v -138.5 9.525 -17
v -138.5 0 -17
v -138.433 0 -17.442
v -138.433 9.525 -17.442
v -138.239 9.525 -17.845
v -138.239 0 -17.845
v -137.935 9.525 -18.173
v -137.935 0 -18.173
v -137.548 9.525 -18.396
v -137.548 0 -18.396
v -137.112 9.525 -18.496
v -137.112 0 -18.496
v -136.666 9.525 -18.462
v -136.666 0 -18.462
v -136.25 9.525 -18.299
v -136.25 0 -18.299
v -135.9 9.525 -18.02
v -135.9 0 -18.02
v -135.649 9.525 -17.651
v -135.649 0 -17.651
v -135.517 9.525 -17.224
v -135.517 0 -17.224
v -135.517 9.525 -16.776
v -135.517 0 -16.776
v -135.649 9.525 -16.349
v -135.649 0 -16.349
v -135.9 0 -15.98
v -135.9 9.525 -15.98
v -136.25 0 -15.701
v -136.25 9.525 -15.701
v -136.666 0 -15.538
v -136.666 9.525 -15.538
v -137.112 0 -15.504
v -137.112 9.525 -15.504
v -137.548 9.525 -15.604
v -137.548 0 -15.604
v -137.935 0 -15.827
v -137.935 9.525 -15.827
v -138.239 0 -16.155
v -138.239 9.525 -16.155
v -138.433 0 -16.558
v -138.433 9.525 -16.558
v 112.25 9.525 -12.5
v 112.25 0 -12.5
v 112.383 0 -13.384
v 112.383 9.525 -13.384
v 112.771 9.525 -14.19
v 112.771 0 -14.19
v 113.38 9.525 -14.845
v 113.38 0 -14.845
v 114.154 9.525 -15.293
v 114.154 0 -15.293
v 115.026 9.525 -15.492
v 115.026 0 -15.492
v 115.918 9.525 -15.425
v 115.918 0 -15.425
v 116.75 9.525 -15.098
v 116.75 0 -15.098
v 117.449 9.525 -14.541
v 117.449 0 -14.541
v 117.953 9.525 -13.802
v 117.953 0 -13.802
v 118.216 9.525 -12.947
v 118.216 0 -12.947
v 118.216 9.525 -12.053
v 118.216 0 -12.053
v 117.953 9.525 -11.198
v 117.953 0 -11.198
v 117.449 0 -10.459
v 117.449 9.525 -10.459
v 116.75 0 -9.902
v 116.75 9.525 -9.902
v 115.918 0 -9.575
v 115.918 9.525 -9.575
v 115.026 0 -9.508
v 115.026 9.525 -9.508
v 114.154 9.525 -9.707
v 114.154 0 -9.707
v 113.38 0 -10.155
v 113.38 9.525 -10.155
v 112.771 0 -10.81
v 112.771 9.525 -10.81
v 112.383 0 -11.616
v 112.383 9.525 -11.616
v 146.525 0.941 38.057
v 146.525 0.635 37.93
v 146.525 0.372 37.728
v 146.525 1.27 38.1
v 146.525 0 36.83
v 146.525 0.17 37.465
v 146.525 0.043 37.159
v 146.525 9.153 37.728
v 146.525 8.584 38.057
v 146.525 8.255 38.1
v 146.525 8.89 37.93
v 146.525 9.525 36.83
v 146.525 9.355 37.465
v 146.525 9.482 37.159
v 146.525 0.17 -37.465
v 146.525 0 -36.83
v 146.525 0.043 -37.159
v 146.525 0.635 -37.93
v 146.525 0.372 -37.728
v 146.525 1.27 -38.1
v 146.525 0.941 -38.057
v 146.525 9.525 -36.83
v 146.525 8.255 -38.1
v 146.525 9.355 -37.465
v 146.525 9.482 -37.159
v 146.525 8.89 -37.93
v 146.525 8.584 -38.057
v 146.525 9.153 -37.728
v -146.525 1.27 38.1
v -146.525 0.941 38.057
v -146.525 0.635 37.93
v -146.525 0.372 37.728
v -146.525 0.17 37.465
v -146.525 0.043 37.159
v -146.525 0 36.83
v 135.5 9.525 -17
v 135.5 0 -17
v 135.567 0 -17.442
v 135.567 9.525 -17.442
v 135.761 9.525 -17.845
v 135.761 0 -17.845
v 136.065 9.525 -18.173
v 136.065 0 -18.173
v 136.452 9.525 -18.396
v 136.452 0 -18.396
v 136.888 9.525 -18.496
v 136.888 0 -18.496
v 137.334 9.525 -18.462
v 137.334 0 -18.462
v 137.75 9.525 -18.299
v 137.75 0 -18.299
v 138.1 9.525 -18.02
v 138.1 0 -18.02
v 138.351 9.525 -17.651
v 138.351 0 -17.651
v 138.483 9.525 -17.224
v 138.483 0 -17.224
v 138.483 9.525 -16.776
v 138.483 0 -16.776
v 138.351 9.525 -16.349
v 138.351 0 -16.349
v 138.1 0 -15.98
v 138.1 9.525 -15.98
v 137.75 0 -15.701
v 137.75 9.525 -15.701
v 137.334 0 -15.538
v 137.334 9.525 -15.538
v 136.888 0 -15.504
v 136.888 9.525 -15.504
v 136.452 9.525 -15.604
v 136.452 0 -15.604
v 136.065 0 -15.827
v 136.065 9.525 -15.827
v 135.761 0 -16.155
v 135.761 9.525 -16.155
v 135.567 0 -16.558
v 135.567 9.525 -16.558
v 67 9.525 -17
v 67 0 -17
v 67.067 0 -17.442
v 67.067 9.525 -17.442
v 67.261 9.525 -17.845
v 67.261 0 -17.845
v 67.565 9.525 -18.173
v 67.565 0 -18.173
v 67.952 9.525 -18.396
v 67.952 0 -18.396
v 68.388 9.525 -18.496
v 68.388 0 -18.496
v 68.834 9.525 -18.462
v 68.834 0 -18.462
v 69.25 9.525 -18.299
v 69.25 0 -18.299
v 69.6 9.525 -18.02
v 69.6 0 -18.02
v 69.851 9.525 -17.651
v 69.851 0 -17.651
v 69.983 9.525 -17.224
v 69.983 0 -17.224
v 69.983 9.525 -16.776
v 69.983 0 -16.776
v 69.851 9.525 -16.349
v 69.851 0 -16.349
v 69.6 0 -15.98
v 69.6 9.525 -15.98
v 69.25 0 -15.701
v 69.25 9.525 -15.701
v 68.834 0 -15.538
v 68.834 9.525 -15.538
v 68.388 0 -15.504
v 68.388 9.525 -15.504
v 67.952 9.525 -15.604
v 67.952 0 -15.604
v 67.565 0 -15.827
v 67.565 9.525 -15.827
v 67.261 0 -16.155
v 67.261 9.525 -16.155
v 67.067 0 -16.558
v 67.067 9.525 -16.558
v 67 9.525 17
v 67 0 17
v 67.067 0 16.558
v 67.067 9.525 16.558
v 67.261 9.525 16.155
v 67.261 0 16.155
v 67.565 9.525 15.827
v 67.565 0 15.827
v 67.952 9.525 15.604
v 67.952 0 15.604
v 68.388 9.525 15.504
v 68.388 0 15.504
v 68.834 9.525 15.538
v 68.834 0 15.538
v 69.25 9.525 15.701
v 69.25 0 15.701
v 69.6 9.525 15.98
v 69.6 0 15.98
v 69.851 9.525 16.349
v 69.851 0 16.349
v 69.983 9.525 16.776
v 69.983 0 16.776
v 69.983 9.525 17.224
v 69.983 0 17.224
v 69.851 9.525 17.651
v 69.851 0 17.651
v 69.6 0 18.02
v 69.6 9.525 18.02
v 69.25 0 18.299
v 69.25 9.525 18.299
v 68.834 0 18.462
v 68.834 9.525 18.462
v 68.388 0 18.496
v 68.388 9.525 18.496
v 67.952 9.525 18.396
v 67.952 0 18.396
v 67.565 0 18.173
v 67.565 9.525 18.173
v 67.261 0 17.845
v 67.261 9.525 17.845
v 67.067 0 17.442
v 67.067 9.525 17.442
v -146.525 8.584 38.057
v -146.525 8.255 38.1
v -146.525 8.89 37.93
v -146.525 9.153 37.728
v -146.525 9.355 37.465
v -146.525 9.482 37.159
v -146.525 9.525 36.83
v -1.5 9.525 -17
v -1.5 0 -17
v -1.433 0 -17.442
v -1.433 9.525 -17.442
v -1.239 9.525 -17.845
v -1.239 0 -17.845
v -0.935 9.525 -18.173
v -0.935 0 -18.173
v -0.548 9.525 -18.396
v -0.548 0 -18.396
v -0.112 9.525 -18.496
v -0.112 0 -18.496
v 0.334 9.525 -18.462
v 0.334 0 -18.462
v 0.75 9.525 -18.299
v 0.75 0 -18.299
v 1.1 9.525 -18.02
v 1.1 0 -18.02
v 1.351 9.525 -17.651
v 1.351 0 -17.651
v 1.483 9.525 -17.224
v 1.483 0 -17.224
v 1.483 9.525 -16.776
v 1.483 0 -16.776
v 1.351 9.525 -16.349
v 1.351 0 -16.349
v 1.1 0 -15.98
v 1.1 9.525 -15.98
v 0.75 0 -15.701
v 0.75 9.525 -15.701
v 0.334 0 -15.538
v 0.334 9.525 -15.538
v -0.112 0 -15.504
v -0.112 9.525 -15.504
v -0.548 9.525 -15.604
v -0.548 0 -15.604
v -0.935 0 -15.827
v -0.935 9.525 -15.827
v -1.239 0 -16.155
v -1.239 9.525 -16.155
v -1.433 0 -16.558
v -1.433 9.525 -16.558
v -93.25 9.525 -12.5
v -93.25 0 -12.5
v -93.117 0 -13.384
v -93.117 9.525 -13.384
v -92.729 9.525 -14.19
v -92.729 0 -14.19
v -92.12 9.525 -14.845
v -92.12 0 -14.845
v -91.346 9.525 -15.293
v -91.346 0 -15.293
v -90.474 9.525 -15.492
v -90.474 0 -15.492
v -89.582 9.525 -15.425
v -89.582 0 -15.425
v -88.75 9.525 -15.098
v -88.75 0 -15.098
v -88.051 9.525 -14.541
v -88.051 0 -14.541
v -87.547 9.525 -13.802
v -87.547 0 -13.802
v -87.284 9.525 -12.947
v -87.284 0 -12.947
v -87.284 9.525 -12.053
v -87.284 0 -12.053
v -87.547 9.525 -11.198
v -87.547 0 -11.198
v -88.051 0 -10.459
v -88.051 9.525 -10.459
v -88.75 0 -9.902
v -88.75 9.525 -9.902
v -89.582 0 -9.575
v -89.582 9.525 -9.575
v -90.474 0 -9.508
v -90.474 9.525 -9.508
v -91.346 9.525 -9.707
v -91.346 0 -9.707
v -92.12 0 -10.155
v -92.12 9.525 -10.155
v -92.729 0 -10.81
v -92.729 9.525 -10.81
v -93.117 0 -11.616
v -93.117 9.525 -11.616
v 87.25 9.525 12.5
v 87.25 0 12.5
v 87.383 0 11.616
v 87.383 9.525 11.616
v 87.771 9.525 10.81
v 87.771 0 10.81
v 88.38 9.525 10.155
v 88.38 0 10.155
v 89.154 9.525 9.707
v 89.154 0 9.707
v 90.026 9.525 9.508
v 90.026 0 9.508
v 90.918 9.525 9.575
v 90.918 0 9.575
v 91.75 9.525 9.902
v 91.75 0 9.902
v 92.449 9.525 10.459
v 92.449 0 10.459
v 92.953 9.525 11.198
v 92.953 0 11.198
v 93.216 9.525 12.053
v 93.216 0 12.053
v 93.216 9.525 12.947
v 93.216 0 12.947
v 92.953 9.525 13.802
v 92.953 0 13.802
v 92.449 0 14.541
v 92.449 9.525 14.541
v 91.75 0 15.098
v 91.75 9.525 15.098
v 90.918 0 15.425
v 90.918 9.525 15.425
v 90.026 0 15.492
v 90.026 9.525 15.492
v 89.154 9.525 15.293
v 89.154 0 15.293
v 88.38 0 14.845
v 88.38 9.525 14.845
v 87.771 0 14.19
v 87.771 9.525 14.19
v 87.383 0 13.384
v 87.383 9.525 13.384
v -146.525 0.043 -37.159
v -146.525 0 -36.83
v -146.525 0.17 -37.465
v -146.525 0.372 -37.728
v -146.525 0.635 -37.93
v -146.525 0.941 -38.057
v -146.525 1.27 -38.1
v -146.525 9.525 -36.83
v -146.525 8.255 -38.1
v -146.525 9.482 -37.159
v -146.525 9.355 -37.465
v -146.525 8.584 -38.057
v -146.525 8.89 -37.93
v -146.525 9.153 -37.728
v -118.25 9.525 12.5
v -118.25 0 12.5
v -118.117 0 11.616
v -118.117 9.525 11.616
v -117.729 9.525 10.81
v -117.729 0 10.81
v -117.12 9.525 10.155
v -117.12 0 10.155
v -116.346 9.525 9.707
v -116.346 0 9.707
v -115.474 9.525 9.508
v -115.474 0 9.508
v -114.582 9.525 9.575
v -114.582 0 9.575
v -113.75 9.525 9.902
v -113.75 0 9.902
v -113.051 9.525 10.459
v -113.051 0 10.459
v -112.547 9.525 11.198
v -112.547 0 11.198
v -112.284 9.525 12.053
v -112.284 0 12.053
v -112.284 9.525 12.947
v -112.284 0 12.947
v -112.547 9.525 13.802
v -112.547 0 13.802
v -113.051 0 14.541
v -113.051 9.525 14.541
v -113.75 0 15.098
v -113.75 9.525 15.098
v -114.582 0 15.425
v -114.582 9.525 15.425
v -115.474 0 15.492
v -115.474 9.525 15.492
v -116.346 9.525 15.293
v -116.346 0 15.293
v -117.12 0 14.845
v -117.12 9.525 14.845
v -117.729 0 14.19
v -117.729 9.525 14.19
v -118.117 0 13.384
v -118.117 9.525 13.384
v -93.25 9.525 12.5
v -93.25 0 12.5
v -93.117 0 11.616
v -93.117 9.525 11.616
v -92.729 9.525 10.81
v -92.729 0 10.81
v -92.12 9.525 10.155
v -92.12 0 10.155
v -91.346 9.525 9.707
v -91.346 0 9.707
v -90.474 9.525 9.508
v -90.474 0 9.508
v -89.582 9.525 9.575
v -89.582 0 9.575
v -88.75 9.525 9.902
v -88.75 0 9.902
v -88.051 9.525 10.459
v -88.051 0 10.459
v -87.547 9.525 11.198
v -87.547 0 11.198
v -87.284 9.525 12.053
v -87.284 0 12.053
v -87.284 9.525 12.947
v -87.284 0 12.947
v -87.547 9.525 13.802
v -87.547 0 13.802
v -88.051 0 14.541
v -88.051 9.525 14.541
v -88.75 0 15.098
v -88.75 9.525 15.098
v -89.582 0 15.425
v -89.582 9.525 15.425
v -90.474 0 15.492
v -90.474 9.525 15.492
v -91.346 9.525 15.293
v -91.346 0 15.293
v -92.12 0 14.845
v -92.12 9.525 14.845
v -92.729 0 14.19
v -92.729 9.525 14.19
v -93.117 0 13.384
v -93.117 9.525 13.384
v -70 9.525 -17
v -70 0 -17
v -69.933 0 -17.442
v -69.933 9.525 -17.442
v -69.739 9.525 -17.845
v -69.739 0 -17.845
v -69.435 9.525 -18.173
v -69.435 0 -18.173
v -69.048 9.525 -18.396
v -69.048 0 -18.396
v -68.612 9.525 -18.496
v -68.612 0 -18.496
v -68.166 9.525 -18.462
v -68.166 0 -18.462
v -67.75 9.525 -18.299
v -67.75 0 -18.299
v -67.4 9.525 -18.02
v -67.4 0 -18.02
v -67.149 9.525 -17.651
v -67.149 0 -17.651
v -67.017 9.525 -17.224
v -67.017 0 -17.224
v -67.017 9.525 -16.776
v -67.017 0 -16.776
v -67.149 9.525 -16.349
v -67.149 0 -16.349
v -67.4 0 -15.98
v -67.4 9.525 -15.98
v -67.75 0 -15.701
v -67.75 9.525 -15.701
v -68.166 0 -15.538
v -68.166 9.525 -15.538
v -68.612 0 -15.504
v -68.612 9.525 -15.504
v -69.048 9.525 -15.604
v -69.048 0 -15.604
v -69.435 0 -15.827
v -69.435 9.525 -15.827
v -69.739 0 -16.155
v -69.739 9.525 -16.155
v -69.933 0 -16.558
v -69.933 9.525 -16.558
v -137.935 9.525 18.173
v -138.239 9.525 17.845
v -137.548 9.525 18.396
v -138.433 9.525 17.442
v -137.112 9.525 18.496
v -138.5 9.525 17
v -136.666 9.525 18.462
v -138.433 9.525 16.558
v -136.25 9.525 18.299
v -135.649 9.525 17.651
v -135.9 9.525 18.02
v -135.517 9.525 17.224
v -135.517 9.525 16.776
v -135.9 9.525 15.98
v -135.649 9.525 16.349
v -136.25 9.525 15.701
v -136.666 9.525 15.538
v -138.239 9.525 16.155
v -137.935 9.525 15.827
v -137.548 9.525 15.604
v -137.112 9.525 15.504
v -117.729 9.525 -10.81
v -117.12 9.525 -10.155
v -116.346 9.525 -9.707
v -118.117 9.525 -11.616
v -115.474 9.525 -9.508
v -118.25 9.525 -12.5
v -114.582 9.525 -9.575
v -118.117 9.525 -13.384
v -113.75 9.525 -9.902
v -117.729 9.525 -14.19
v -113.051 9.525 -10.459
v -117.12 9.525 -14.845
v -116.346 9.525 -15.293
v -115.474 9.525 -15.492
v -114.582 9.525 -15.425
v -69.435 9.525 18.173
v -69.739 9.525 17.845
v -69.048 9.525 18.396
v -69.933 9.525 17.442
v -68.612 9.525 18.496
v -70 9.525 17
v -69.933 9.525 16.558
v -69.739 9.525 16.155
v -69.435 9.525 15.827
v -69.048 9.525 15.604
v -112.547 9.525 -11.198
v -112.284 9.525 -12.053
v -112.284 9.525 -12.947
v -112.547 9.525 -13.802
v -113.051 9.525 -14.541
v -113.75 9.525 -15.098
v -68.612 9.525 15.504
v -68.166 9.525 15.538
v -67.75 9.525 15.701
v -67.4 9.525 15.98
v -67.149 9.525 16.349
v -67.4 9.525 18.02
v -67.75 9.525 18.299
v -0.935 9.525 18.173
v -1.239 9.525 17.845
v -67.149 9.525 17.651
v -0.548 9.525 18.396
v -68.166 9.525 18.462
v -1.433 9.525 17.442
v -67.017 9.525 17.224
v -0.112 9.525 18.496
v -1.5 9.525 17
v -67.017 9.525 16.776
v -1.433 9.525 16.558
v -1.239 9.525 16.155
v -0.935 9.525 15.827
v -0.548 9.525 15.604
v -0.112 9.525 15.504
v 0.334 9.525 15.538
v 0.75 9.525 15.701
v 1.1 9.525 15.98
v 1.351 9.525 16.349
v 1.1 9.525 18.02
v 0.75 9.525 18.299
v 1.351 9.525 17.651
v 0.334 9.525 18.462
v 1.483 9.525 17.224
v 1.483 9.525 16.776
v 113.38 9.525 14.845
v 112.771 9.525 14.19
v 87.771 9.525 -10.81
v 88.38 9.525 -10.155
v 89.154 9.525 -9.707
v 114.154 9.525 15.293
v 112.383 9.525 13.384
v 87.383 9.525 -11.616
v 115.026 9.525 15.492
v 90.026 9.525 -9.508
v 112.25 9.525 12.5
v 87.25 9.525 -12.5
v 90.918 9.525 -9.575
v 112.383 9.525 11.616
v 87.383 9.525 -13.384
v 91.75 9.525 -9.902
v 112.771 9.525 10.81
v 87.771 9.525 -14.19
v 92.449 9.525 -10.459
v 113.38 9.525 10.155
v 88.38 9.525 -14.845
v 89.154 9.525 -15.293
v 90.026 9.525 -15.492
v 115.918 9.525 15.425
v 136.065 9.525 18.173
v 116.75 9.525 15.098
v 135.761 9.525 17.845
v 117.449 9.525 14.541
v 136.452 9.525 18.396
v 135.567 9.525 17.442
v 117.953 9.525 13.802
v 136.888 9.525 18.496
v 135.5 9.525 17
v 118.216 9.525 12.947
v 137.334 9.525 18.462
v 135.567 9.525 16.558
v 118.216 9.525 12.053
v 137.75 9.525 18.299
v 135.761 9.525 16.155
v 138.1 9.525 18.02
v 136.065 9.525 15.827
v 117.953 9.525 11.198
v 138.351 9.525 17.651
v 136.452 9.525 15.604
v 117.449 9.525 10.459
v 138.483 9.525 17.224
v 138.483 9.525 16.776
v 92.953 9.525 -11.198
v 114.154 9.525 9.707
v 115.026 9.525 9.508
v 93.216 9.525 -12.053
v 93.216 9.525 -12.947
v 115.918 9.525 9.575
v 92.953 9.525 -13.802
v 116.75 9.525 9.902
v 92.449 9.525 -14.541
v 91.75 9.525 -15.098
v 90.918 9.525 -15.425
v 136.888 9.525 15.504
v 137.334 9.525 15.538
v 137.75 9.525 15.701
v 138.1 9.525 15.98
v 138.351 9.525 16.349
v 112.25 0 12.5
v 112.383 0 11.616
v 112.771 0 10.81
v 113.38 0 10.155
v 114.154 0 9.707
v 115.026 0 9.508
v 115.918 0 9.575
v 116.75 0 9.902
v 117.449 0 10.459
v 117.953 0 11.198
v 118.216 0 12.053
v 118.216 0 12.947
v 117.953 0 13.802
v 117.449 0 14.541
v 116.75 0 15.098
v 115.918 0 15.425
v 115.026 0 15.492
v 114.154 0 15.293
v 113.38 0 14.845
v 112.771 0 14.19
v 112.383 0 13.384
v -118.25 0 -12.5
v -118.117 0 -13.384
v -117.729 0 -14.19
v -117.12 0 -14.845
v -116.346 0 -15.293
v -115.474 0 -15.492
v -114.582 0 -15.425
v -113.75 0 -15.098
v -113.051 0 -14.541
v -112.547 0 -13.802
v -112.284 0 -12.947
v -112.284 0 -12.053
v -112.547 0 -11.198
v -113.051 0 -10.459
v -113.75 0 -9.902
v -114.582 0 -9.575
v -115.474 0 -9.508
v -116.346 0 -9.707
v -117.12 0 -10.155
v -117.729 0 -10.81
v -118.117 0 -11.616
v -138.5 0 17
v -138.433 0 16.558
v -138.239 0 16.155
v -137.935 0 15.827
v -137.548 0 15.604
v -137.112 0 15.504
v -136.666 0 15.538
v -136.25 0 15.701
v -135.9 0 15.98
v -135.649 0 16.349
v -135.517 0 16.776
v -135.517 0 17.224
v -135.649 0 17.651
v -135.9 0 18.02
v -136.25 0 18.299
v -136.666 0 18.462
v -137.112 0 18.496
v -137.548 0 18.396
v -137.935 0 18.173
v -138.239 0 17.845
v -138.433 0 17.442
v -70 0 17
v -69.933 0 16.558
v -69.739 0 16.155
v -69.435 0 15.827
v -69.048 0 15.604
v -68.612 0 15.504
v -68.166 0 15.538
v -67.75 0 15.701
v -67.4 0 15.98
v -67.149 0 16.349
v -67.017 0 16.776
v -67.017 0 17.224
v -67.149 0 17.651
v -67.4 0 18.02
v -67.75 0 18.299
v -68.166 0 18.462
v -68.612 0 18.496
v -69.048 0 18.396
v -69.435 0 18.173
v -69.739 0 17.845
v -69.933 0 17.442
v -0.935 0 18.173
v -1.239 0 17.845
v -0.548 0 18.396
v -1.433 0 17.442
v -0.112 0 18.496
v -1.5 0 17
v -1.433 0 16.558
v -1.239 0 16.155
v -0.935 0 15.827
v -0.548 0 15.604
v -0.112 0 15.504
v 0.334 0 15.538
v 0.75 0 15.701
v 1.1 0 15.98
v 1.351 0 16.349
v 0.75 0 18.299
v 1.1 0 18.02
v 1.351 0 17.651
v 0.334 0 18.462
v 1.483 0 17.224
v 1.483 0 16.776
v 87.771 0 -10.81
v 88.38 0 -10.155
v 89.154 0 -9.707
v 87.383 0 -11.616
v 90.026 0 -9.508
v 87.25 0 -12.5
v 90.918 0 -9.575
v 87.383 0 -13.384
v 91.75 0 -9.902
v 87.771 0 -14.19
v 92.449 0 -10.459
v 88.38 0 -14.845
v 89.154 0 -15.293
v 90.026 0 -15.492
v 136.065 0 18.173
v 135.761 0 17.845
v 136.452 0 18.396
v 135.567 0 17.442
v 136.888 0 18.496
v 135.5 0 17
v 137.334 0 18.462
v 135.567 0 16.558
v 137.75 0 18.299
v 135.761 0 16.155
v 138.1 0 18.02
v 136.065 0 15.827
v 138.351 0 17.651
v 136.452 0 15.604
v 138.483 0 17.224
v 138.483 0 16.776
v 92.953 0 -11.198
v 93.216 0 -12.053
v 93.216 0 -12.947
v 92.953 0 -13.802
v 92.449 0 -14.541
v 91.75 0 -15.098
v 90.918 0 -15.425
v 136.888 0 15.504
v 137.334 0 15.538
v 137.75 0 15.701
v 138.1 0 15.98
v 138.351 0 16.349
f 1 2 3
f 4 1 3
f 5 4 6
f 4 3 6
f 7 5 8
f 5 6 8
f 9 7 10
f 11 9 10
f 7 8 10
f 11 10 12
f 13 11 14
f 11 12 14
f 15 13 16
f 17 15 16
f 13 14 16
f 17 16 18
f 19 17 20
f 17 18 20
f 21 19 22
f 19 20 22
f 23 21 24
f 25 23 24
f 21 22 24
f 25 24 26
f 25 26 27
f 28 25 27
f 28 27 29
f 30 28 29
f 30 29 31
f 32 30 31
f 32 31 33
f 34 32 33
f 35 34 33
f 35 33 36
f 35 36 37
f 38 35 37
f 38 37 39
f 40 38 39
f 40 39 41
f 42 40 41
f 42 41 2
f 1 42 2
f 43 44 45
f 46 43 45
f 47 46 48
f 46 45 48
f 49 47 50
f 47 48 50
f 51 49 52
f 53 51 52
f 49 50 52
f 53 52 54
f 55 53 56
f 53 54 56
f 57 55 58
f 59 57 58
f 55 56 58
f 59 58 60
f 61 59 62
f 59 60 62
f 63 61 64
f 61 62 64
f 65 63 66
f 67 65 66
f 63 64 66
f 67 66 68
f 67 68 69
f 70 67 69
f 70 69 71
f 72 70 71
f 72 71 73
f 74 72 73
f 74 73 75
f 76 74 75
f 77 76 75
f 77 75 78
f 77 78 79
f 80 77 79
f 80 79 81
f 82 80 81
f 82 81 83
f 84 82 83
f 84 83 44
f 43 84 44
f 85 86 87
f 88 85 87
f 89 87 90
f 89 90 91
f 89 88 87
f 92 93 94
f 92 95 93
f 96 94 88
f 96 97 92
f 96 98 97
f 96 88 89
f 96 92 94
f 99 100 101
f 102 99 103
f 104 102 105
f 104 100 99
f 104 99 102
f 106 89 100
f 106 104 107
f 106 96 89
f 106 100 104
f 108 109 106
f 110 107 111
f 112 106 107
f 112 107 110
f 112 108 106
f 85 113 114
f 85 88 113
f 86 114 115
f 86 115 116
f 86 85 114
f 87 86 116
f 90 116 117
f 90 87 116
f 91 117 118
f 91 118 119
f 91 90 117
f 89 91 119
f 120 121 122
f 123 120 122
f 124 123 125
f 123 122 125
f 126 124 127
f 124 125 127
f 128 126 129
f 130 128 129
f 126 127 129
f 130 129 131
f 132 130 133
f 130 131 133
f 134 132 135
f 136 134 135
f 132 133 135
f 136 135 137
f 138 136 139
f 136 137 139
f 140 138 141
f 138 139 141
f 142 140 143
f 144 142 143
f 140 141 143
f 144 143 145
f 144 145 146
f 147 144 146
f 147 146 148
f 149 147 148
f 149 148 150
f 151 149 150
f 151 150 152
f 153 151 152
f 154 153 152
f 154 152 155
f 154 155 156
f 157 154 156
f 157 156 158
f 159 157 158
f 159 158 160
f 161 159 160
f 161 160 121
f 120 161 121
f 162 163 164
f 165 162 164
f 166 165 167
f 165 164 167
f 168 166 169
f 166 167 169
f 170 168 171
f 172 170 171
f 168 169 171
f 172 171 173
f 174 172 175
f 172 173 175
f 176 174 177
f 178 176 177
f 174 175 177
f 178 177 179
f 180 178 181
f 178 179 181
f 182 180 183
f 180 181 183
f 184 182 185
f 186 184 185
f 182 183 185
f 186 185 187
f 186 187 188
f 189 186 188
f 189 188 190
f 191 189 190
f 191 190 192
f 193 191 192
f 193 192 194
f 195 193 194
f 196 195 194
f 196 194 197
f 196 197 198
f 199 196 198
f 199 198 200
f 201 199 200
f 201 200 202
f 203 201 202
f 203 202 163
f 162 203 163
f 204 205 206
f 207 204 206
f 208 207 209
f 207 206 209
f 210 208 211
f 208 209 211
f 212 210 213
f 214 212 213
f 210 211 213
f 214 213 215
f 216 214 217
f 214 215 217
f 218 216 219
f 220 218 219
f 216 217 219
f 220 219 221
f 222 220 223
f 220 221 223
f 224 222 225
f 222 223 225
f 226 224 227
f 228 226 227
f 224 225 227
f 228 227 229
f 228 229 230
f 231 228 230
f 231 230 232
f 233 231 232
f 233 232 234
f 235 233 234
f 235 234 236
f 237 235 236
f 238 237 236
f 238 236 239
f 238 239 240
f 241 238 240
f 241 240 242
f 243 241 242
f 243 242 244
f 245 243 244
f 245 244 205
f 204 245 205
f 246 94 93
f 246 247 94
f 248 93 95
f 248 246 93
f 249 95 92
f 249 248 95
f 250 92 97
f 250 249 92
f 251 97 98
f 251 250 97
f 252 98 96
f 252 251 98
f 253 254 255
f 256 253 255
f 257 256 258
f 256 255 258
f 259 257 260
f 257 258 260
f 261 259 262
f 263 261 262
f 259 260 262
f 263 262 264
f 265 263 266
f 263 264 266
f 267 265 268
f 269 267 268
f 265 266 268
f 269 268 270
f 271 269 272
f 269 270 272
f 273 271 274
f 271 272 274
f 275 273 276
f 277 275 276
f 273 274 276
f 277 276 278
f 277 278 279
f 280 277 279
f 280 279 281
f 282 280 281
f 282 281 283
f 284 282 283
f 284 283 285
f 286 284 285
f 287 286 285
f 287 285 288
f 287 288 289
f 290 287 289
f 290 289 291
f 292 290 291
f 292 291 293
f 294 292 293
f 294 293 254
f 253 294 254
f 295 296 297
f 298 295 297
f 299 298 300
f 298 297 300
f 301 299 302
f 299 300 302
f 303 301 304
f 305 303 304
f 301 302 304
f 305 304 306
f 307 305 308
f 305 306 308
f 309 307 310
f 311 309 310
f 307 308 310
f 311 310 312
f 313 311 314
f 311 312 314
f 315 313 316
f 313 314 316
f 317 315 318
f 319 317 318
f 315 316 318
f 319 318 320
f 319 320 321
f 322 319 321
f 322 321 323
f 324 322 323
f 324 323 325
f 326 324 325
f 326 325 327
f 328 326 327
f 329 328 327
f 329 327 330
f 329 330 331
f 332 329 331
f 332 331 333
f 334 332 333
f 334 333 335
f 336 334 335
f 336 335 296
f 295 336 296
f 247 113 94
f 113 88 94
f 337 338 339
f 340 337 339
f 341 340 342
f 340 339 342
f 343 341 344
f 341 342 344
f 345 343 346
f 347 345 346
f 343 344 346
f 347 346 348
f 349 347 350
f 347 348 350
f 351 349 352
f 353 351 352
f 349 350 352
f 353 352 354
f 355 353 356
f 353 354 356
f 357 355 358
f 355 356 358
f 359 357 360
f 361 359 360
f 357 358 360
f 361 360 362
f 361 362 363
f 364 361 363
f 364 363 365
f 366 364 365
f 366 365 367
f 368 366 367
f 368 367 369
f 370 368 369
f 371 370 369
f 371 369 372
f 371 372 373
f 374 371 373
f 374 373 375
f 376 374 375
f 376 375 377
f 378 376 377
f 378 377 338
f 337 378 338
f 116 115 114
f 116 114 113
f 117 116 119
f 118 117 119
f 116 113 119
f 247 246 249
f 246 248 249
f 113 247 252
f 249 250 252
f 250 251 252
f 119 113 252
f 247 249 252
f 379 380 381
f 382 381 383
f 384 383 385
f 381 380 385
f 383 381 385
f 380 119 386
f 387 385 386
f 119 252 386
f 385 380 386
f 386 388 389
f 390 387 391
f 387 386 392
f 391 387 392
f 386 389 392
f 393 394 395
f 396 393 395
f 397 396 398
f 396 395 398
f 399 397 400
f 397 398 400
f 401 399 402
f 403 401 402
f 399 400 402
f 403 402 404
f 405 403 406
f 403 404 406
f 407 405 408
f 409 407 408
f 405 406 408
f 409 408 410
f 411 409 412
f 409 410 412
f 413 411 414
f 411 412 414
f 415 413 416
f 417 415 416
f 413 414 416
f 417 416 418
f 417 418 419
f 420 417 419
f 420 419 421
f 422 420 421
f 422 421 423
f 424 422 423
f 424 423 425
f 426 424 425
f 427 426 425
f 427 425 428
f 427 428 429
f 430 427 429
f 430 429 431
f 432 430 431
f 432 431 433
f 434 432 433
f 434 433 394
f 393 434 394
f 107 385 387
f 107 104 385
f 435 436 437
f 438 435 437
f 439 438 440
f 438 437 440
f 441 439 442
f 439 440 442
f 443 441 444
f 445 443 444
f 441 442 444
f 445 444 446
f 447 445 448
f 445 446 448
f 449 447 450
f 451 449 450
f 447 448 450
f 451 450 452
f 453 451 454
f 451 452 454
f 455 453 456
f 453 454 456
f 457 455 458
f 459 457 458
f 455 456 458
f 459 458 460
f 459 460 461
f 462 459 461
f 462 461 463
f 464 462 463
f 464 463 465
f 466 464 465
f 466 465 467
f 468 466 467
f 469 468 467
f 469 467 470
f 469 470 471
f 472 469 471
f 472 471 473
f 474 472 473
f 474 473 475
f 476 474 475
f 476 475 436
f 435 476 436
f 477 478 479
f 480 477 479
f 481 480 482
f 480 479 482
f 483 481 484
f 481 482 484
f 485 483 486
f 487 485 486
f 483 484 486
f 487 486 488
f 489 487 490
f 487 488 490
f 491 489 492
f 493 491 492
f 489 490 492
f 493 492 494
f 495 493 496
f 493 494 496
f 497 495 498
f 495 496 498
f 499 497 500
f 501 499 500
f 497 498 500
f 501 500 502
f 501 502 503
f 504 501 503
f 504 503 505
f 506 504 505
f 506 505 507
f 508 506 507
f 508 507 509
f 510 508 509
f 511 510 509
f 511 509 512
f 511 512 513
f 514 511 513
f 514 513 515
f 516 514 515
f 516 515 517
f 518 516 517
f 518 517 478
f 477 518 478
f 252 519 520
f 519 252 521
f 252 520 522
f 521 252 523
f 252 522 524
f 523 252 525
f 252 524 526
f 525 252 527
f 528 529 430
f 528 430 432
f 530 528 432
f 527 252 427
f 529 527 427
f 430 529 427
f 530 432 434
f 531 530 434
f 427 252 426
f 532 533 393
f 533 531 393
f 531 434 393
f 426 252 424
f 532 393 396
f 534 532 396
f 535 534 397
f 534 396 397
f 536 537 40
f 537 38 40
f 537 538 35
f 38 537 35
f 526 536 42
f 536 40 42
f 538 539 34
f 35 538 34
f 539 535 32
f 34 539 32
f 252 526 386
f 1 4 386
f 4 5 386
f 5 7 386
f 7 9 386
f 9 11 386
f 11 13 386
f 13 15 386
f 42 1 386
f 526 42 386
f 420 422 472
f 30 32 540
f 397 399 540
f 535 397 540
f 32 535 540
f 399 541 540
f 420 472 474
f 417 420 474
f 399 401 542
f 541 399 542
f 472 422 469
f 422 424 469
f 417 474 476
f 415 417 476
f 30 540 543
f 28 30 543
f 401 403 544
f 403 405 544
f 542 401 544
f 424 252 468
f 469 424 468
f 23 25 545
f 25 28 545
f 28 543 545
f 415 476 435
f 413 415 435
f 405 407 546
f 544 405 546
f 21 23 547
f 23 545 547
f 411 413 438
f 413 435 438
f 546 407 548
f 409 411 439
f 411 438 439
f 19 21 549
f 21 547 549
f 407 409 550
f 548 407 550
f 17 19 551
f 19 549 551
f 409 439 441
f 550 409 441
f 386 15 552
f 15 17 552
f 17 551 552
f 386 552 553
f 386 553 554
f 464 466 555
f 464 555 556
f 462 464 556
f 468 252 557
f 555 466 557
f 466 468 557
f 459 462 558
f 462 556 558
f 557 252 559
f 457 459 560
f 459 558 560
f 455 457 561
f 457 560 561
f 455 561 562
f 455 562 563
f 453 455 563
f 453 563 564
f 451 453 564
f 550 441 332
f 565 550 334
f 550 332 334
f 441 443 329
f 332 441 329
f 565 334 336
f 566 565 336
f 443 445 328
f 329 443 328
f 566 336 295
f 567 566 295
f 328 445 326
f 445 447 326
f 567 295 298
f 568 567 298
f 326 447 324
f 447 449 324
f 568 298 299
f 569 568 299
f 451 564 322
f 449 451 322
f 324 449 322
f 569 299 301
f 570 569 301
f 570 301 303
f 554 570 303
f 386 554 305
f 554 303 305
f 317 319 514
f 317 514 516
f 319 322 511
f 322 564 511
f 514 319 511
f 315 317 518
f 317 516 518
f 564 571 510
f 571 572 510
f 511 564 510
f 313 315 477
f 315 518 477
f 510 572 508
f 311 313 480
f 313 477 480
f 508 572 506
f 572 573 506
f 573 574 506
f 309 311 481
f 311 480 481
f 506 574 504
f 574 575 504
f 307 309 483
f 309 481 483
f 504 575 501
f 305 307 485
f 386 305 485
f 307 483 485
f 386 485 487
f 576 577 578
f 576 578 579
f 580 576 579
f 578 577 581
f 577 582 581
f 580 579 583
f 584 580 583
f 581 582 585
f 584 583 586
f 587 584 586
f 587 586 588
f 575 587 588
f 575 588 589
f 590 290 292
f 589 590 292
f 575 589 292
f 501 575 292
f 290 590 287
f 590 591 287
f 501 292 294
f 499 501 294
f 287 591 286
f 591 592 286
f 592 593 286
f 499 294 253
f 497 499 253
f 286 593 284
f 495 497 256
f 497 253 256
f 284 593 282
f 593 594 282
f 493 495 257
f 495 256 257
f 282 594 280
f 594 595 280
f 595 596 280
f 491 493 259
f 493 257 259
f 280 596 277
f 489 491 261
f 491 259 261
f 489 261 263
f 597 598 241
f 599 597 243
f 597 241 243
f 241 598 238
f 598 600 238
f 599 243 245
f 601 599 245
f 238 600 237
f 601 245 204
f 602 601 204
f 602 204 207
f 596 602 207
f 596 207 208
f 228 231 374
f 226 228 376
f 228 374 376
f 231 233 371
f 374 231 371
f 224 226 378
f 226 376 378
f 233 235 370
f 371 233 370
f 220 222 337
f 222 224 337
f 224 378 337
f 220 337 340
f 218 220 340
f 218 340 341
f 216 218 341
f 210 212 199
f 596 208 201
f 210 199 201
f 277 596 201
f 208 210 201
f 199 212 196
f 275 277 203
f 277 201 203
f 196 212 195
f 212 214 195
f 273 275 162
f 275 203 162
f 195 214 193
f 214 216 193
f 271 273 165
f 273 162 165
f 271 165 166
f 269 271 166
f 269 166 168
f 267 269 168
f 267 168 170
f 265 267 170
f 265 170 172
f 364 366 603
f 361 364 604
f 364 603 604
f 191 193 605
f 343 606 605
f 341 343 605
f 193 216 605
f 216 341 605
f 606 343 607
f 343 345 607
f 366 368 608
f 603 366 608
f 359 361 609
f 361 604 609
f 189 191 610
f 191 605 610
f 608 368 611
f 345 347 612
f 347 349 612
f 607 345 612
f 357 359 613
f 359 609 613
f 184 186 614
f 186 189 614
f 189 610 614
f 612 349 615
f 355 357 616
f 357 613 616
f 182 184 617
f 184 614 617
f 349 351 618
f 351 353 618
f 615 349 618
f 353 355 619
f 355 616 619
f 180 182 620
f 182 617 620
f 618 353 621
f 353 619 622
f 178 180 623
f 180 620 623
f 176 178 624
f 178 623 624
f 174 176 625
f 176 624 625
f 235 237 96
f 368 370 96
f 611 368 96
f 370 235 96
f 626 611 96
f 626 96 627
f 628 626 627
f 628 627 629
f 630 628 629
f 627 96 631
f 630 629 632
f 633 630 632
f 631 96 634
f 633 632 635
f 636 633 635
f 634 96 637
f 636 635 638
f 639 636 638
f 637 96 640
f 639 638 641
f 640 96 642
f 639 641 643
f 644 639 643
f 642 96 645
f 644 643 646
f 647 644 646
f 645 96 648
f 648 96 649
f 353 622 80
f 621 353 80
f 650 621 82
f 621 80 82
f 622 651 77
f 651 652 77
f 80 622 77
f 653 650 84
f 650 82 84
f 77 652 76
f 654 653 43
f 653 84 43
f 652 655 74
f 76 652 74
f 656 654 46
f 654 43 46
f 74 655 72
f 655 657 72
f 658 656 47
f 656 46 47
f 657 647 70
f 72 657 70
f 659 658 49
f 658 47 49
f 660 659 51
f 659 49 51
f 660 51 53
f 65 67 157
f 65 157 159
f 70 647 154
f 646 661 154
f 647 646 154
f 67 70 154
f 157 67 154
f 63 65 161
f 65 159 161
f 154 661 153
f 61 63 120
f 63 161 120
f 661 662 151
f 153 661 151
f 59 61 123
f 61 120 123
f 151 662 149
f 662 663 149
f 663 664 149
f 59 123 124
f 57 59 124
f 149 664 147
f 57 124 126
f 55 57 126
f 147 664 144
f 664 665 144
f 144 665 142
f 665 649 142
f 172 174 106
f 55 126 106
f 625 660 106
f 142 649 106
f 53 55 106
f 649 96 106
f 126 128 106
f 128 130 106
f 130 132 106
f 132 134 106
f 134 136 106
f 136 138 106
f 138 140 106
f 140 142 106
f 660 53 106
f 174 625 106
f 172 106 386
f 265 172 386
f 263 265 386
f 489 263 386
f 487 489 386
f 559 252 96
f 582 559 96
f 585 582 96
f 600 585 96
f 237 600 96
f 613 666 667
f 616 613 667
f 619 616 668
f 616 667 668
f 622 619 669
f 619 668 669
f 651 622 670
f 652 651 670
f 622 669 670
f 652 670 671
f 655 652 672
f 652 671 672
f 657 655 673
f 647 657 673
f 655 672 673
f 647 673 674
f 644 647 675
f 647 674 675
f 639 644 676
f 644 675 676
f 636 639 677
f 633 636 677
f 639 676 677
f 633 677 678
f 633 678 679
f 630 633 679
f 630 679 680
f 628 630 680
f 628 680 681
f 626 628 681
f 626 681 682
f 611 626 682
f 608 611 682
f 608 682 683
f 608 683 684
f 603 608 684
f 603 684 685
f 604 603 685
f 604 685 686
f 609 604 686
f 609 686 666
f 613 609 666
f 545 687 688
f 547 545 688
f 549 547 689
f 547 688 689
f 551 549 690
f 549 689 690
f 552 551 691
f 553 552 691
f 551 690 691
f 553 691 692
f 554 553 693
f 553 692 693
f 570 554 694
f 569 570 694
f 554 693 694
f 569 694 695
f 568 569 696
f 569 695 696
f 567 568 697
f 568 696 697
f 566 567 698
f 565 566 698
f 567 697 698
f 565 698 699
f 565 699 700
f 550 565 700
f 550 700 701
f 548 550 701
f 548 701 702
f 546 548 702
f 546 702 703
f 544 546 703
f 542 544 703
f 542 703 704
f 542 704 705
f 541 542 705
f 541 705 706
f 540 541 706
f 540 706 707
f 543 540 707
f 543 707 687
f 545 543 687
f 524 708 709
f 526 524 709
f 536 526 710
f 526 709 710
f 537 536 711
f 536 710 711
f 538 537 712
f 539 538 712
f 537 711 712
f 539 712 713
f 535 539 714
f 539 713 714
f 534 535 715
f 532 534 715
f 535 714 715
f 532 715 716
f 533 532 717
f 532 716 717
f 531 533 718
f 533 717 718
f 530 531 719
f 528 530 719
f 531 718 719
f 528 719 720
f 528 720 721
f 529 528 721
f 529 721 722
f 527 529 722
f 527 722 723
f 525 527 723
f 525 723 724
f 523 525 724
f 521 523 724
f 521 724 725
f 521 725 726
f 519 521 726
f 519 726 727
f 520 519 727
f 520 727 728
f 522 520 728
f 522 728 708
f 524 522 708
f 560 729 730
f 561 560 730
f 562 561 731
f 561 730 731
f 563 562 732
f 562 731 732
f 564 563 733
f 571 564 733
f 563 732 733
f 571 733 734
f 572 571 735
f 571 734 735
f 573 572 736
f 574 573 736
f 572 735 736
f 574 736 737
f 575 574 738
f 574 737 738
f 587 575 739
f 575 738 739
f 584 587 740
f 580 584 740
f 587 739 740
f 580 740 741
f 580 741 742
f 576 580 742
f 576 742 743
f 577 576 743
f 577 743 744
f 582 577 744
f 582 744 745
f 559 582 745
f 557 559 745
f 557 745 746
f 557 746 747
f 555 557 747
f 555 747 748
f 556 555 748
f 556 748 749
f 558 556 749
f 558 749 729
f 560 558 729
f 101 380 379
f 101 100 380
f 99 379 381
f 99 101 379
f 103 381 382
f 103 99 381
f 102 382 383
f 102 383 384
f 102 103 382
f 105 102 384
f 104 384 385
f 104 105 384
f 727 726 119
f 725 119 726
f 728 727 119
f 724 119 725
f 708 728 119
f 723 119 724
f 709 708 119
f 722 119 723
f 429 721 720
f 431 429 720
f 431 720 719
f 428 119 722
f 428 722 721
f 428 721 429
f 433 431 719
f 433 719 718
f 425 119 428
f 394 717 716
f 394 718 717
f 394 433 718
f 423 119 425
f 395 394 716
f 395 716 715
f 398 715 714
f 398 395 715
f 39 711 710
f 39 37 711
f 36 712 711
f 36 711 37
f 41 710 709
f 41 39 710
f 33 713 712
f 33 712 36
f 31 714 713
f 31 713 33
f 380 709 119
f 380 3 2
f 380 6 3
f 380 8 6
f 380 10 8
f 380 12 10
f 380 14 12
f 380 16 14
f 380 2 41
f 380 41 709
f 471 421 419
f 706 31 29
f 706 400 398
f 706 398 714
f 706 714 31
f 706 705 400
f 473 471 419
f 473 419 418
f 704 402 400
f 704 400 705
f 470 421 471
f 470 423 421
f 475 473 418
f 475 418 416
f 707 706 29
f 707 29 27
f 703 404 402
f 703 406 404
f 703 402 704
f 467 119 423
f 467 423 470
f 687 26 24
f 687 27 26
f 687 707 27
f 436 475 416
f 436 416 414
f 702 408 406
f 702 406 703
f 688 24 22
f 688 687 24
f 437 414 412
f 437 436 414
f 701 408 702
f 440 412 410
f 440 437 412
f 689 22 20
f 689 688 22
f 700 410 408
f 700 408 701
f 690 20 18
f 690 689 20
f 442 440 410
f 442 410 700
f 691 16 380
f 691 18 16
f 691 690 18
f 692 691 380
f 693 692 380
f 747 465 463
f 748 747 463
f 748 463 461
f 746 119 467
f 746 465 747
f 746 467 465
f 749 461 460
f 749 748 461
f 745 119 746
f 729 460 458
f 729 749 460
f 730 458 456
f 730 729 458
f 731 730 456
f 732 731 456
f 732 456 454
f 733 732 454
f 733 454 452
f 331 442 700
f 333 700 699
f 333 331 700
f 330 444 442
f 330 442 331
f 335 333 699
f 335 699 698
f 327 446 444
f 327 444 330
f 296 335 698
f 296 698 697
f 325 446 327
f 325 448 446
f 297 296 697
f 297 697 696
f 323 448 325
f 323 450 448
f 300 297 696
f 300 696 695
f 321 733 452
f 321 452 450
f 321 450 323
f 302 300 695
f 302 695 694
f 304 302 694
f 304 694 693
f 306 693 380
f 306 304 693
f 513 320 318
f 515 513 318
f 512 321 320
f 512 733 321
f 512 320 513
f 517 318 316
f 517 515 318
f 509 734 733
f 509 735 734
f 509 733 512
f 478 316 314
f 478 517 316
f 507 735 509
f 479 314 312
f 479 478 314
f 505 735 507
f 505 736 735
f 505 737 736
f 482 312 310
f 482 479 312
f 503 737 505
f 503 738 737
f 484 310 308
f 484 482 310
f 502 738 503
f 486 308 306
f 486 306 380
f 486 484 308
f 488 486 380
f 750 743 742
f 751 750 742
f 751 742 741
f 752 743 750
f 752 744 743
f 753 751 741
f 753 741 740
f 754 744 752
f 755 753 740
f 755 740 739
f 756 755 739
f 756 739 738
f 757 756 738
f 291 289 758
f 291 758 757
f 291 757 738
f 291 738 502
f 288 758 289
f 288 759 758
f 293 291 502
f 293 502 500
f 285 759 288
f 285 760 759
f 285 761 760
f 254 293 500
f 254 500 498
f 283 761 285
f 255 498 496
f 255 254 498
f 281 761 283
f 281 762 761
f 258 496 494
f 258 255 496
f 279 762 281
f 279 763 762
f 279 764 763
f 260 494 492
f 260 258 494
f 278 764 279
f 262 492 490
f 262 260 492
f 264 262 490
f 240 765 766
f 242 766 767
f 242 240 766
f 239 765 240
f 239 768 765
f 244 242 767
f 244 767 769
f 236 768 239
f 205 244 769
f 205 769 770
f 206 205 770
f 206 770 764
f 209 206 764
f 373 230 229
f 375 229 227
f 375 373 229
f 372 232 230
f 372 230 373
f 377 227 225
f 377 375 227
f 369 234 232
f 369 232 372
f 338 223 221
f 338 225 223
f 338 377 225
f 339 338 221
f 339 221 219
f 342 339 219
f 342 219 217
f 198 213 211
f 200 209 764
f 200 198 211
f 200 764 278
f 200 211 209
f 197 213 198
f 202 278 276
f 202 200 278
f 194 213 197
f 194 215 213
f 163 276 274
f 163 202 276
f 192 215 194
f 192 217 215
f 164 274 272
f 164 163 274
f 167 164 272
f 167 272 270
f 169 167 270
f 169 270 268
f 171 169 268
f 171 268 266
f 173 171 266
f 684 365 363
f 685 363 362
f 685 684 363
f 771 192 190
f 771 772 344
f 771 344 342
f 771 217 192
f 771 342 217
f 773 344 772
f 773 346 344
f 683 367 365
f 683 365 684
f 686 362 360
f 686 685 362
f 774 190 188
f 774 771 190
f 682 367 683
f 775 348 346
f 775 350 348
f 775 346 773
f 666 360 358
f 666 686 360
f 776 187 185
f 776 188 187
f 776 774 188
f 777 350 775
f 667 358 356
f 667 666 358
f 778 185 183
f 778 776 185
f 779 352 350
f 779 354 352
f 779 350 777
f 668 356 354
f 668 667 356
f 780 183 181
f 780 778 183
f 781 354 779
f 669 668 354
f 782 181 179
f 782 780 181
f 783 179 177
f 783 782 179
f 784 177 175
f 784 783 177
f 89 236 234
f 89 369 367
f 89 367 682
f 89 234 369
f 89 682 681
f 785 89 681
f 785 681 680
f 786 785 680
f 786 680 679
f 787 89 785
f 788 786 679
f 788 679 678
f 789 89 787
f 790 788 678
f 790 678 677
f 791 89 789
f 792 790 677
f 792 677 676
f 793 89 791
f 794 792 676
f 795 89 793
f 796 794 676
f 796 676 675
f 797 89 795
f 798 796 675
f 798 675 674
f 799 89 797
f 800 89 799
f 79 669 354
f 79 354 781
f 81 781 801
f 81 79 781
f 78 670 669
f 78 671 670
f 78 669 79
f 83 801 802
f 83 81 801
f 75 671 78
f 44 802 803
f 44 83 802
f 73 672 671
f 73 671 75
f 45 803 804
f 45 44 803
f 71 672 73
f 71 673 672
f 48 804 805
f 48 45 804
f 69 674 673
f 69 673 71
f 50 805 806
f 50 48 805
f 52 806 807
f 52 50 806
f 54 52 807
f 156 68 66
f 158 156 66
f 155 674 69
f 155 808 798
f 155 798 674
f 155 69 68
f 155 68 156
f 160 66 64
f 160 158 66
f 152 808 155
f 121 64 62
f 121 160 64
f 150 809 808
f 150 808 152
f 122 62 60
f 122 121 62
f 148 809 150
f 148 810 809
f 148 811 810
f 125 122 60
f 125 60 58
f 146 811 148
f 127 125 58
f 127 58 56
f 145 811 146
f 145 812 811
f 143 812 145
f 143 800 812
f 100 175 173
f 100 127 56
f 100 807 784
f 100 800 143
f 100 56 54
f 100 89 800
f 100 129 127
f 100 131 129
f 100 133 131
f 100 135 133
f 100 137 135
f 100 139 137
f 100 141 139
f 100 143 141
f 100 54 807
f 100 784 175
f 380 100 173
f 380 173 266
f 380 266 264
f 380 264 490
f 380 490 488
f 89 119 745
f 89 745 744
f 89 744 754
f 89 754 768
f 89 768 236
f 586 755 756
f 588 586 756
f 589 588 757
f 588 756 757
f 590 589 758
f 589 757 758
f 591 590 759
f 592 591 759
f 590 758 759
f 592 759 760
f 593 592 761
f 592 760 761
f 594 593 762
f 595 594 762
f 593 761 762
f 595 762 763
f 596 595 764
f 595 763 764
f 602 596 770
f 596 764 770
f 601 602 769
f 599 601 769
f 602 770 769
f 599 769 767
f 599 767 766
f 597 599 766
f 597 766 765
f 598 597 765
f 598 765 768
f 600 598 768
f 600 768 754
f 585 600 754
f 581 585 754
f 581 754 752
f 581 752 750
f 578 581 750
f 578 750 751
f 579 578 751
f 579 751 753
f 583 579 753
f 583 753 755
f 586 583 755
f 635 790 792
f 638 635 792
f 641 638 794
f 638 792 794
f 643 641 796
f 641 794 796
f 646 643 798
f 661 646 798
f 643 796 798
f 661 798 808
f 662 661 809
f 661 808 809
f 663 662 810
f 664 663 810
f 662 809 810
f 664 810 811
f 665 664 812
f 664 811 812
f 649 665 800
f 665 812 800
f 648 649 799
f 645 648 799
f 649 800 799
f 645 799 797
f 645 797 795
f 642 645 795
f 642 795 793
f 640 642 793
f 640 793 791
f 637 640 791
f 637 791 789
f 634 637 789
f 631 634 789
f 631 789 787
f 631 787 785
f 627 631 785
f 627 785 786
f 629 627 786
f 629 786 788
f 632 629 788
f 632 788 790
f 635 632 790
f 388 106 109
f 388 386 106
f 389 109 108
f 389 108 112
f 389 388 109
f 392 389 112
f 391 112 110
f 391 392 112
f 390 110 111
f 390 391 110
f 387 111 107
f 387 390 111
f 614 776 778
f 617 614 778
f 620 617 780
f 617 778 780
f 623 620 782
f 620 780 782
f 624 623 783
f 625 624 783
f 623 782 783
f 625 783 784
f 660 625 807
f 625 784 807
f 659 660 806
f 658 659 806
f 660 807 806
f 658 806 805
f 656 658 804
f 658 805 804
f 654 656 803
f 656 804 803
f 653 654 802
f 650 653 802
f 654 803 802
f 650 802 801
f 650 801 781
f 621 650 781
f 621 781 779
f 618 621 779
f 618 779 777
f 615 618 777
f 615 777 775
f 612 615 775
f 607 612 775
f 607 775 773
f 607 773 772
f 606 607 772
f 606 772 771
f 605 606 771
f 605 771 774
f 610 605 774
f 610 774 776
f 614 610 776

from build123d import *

# Parameters (mm, degrees)
SKETCH1_W             = 76.2
SKETCH1_H             = 9.525
BOSS_EXTRUDE1_DEPTH   = 146.524999939
F_3_0MM_DOWEL_HOLE2_D = 3
FILLET1_R             = 1.27
F_6_0MM_DOWEL_HOLE2_D = 6


with BuildPart() as part:
    # Sketch1 → Boss-Extrude1 (new body, symmetric)
    with BuildSketch(Plane(origin=(0, 0, 0), x_dir=(0, 0, -1), z_dir=(1, 0, 0))):
        with Locations((0, 4.7625)):
            Rectangle(SKETCH1_W, SKETCH1_H)
    extrude(amount=BOSS_EXTRUDE1_DEPTH, both=True)

    # Ø3.0mm Dowel Hole2 (through all)
    with Locations(Plane(origin=(0, 9.525, 0), x_dir=(1, 0, 0), z_dir=(0, 1, 0))):
        with Locations((-137, 17.000000036), (-137, -17.000000036), (-68.5, 17.000000036), (-68.5, -17.000000036), (0, 17.000000036), (0, -17.000000036), (68.5, 17.000000036), (68.5, -17.000000036), (137, 17.000000036), (137, -17.000000036)):
            Hole(F_3_0MM_DOWEL_HOLE2_D / 2)

    # Fillet1
    fillet1_edges = [part.edges().sort_by_distance(p)[0] for p in [
        (0, 9.525, 38.1),
        (0, 9.525, -38.1),
        (0, 0, -38.1),
        (0, 0, 38.1),
    ]]
    fillet(fillet1_edges, radius=FILLET1_R)

    # Ø6.0mm Dowel Hole2 (through all)
    with Locations(Plane(origin=(0, 9.525, 0), x_dir=(1, 0, 0), z_dir=(0, 1, 0))):
        with Locations((-115.25, 12.5), (-115.25, -12.5), (-90.25, 12.5), (-90.25, -12.5), (90.25, 12.5), (90.25, -12.5), (115.25, 12.5), (115.25, -12.5)):
            Hole(F_6_0MM_DOWEL_HOLE2_D / 2)


solid = part.part
